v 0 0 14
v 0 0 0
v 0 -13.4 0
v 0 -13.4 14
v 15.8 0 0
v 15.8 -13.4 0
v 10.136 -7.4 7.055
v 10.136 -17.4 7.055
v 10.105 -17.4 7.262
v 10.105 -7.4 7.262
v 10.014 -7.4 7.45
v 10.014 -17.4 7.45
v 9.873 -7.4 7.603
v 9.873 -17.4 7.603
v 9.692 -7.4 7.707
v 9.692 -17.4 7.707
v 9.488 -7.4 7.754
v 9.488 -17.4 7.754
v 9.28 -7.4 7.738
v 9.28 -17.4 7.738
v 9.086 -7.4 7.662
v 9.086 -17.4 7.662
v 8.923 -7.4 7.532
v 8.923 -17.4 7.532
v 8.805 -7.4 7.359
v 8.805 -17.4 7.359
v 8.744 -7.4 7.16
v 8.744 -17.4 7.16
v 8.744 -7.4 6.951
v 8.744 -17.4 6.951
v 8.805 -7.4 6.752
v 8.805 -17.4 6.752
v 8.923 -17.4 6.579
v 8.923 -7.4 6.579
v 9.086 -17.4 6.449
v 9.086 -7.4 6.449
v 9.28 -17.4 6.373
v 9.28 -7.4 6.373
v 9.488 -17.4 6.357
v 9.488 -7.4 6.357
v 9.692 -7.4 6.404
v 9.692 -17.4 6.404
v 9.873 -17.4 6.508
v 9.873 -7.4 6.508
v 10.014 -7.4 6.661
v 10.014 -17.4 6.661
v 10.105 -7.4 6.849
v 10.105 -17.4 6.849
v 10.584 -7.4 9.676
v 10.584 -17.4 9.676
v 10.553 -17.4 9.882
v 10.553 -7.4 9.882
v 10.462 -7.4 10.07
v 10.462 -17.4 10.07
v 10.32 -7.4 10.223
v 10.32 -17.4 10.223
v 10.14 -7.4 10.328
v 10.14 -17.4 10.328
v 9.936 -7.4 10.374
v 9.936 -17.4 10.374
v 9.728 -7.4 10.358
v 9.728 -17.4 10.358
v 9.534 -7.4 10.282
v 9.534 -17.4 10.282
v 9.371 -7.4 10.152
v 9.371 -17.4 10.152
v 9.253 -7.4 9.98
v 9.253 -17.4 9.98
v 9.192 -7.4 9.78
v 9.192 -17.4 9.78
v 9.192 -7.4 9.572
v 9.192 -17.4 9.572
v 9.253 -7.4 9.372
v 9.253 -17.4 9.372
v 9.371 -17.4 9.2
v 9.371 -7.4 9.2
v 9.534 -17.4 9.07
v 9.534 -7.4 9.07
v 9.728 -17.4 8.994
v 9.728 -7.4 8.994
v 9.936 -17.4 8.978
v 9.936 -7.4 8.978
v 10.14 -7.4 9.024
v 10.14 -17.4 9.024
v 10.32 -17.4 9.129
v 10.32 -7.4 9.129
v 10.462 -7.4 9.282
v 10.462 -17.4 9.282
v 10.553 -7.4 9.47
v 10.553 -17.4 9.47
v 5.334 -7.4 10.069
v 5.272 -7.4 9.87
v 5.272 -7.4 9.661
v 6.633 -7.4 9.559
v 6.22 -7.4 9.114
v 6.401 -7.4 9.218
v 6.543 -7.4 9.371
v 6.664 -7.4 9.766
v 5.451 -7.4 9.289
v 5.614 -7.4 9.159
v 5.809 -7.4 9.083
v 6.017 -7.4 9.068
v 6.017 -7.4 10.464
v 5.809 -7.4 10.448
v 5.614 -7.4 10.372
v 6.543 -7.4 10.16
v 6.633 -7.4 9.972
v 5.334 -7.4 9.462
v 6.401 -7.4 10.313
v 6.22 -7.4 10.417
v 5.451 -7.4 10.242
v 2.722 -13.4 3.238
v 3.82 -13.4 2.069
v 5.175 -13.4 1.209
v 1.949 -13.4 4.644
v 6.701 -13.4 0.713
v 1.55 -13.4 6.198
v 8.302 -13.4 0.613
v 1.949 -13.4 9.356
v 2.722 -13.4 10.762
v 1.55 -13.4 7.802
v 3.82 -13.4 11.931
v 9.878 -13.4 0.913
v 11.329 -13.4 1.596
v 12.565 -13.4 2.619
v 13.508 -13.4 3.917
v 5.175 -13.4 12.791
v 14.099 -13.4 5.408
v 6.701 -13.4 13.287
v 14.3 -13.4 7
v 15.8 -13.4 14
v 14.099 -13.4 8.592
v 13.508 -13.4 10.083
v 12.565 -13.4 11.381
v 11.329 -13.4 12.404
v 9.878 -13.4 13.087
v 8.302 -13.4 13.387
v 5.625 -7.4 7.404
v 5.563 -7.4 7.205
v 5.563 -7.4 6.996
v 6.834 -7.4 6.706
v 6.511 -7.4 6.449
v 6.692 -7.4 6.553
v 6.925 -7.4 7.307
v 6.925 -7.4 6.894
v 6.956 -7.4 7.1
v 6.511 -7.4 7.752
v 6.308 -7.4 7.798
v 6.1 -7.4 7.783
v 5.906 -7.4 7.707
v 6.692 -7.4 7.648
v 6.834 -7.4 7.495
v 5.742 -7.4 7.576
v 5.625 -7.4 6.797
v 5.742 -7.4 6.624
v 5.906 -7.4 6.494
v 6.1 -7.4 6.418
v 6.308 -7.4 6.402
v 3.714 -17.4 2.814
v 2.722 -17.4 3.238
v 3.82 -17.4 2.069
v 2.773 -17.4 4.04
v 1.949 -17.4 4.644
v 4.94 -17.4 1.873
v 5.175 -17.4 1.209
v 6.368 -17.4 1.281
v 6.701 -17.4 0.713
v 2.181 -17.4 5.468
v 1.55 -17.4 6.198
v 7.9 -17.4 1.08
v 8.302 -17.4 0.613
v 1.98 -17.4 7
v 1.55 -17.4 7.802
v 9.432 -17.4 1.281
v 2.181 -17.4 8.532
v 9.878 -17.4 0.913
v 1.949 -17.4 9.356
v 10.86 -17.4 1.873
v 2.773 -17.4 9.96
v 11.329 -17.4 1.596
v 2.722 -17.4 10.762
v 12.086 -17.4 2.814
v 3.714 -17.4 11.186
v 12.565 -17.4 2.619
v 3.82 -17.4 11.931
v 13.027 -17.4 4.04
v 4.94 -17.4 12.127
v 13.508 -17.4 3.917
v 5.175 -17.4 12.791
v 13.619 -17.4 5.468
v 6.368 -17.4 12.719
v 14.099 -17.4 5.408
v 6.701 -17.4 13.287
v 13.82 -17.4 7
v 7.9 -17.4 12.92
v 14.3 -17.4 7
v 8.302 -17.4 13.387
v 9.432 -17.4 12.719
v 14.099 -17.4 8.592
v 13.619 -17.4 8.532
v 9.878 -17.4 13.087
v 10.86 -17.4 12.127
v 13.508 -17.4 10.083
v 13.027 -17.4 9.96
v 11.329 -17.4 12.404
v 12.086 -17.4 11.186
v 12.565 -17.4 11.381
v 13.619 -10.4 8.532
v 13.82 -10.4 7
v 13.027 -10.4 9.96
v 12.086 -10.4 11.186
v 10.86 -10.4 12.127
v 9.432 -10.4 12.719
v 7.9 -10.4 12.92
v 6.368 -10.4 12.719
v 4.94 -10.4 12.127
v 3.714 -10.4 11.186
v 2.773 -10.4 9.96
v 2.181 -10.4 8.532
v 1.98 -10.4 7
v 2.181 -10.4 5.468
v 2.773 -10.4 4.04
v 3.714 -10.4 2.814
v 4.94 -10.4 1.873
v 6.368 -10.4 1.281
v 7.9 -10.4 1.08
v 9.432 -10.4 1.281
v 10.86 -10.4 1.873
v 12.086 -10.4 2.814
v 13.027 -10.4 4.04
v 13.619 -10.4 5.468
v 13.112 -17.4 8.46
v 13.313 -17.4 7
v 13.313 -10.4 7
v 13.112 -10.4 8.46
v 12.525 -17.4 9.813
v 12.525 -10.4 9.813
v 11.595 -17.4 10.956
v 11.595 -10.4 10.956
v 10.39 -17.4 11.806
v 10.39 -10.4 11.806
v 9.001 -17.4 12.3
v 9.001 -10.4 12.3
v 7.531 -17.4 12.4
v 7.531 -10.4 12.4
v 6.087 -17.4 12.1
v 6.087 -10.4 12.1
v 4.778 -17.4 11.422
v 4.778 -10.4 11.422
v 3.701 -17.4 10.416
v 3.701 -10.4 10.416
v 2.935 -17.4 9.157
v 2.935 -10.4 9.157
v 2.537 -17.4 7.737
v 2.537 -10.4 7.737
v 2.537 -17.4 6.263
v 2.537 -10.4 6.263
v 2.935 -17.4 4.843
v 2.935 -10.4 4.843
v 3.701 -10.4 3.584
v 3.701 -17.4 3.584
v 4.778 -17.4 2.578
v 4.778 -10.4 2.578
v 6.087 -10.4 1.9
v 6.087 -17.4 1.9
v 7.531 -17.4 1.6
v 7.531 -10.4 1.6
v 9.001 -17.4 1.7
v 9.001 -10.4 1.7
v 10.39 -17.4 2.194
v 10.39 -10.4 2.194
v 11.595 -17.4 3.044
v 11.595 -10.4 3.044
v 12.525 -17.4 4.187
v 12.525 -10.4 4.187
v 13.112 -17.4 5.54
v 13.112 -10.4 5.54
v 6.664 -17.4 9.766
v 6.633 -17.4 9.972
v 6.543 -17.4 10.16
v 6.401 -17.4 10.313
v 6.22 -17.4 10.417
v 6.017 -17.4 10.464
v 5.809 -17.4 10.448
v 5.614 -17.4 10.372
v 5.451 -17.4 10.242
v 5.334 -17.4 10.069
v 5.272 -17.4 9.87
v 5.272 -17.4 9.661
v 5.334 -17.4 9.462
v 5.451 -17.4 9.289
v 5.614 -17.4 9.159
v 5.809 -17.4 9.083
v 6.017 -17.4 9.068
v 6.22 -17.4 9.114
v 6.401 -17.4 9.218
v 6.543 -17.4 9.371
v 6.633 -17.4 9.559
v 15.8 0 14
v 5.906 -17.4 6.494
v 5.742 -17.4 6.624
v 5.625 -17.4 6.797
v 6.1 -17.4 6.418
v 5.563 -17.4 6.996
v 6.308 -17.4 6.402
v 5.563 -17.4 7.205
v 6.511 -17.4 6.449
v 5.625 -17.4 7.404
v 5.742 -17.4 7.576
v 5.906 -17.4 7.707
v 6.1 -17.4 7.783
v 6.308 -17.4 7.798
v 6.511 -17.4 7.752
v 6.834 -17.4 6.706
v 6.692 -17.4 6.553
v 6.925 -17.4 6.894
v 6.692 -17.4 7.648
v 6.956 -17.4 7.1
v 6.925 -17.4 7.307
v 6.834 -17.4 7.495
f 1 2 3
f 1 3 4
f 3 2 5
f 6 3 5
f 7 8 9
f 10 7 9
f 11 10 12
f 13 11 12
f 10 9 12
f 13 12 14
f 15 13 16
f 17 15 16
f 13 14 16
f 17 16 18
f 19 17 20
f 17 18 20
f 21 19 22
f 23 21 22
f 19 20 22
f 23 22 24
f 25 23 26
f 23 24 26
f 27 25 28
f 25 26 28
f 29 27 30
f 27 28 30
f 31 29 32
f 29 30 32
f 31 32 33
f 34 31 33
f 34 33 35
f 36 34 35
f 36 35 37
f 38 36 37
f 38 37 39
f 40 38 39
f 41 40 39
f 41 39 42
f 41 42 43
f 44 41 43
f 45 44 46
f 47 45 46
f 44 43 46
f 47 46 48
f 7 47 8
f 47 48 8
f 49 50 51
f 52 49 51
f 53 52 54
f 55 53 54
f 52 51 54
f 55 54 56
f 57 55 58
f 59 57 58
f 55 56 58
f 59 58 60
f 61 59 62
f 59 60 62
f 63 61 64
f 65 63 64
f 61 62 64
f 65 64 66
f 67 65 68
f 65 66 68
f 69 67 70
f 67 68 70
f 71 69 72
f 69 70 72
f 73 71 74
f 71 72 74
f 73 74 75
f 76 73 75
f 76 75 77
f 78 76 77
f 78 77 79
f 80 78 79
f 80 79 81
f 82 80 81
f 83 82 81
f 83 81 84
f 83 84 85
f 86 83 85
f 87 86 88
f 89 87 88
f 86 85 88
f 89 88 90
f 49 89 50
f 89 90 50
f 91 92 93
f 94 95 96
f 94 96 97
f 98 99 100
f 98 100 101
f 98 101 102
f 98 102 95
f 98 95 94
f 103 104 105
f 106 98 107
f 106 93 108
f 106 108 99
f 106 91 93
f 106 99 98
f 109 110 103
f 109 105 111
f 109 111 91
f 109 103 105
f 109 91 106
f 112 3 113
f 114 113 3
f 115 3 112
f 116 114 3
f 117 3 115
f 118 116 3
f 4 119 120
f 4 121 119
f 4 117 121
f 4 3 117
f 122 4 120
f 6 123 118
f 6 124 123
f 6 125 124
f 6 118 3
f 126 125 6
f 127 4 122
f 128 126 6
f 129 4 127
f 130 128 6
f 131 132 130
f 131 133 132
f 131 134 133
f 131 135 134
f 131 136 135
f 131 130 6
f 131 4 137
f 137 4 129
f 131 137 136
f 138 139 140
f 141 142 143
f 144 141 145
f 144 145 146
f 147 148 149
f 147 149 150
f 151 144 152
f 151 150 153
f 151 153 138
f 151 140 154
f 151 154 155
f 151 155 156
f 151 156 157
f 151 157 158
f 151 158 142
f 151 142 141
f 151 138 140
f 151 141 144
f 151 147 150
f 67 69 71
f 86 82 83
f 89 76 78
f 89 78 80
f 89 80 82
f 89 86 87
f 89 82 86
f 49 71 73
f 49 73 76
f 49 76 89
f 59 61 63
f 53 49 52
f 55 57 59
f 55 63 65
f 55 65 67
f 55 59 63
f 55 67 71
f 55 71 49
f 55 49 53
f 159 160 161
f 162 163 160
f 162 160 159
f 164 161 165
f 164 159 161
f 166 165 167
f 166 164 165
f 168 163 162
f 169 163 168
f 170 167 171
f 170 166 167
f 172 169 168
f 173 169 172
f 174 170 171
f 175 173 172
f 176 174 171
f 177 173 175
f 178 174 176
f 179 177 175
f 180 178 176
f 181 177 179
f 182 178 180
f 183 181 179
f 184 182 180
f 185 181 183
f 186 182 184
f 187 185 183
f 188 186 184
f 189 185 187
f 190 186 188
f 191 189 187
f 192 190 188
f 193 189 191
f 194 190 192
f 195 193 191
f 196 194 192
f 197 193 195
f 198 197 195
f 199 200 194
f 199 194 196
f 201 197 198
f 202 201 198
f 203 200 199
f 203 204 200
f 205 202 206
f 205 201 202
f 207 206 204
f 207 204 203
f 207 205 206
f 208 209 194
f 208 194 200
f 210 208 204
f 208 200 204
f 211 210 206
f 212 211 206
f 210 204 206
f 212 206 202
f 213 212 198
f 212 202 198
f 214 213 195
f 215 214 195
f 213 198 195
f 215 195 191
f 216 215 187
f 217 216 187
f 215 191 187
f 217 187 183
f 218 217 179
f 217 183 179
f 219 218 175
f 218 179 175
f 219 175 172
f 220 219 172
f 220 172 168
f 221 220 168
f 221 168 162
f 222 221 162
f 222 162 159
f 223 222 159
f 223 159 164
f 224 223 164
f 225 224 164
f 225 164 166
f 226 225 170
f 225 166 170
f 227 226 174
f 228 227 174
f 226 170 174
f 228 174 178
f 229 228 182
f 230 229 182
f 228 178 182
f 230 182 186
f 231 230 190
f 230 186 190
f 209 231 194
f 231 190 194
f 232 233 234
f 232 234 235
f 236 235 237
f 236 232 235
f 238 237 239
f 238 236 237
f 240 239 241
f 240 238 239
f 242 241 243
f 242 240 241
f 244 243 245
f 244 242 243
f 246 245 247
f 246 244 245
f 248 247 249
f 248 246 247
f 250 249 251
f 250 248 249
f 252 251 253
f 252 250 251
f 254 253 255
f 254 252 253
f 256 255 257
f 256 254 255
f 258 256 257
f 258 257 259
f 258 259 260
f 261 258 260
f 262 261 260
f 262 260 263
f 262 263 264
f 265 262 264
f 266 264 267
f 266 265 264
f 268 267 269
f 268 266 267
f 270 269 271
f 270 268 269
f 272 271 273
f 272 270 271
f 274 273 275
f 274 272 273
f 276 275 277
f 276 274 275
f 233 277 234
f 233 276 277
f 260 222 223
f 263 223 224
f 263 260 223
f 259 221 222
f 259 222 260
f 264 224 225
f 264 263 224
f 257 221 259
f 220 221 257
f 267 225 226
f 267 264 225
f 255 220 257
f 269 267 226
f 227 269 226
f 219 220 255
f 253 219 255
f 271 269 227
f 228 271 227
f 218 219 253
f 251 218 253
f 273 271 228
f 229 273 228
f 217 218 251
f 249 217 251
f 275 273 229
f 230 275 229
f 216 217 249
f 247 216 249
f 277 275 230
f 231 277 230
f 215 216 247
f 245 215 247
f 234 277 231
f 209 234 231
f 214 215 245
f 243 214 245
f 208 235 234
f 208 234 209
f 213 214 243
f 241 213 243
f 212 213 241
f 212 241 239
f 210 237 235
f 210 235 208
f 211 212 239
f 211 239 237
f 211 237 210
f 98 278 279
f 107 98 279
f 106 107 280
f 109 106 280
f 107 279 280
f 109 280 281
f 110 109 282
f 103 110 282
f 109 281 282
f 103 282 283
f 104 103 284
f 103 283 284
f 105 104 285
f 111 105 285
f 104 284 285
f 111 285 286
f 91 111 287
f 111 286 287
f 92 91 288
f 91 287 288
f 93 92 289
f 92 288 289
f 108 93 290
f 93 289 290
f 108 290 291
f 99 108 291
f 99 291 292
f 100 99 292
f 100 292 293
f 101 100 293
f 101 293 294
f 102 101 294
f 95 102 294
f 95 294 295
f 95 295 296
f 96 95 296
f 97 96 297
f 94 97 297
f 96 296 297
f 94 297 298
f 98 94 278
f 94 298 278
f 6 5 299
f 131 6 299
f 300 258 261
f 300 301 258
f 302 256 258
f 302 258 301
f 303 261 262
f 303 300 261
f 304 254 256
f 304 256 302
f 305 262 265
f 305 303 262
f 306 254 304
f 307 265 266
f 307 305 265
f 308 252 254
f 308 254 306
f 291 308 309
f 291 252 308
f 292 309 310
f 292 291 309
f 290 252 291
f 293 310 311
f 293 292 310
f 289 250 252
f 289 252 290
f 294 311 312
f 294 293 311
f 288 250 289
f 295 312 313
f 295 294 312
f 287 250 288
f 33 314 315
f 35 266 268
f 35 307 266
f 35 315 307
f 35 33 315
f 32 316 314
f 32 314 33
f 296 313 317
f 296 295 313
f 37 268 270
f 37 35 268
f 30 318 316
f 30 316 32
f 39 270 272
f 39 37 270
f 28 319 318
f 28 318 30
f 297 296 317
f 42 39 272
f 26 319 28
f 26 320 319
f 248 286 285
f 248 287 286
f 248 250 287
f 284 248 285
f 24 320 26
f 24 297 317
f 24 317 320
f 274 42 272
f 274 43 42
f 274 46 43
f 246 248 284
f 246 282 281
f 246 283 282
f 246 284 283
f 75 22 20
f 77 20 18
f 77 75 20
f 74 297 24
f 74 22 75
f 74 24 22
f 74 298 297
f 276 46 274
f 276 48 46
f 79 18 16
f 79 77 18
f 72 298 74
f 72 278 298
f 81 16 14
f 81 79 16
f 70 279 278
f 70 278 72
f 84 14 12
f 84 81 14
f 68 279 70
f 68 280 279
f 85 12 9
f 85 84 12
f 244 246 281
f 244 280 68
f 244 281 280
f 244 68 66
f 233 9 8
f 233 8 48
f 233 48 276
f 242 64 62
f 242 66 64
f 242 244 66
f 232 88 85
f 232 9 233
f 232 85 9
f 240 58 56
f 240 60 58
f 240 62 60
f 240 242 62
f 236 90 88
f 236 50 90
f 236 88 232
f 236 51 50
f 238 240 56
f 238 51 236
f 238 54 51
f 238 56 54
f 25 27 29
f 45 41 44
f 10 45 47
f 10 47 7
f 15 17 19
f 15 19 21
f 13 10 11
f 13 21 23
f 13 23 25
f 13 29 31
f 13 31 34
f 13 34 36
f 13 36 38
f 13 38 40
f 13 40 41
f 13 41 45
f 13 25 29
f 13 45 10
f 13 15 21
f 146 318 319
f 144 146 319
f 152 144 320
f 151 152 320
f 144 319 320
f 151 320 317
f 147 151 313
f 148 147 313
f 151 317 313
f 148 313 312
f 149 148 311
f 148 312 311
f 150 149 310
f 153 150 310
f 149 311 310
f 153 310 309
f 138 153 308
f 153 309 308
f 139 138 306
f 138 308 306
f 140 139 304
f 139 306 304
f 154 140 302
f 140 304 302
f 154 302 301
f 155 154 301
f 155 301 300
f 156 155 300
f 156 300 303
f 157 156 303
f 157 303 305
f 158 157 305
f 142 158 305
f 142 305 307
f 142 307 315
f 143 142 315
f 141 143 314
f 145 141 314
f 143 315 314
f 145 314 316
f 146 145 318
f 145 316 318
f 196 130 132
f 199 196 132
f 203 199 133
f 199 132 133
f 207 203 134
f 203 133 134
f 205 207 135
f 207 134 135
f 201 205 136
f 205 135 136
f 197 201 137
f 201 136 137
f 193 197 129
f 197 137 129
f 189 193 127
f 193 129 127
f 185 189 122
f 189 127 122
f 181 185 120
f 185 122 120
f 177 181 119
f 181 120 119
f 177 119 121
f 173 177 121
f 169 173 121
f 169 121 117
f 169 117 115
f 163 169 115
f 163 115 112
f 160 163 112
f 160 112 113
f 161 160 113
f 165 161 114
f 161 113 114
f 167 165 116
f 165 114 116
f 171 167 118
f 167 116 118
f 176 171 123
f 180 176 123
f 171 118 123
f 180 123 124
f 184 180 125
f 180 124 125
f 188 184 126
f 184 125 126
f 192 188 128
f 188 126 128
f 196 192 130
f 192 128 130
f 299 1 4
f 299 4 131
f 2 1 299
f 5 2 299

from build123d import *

# Parameters (mm, degrees)
F0_W     = 15.8
F0_H     = 14
F1_DEPTH = 13.4
F2_R     = 6.4
F3_DEPTH = 4
F4_R     = 5.920321
F4_R_2   = 5.413043
F5_DEPTH = 7
F6_R     = 0.7
F7_DEPTH = 10


with BuildPart() as f1:
    # F0 (on Front) → F1 (new body)
    with BuildSketch(Plane.XZ):
        with Locations((7.9, 7)):
            Rectangle(F0_W, F0_H)
    extrude(amount=F1_DEPTH)

    # F2 (on face) → F3 (join)
    with BuildSketch(Plane.XZ.offset(13.4)):
        with Locations((7.9, 7)):
            Circle(F2_R)
    extrude(amount=F3_DEPTH)

    # F4 (on face) → F5 (cut)
    with BuildSketch(Plane.XZ.offset(17.4)):
        with Locations((7.9, 7)):
            Circle(F4_R)
        with Locations((7.9, 7)):
            Circle(F4_R_2, mode=Mode.SUBTRACT)
    extrude(amount=-F5_DEPTH, mode=Mode.SUBTRACT)

    # F6 (on face) → F7 (cut)
    with BuildSketch(Plane.XZ.offset(17.4)):
        with Locations((5.964432, 9.765608)):
            Circle(F6_R)
        with Locations((9.884015, 9.676018)):
            Circle(F6_R)
        with Locations((6.255601, 7.100292)):
            Circle(F6_R)
        with Locations((9.436062, 7.055497)):
            Circle(F6_R)
    extrude(amount=-F7_DEPTH, mode=Mode.SUBTRACT)


solid = f1.part
